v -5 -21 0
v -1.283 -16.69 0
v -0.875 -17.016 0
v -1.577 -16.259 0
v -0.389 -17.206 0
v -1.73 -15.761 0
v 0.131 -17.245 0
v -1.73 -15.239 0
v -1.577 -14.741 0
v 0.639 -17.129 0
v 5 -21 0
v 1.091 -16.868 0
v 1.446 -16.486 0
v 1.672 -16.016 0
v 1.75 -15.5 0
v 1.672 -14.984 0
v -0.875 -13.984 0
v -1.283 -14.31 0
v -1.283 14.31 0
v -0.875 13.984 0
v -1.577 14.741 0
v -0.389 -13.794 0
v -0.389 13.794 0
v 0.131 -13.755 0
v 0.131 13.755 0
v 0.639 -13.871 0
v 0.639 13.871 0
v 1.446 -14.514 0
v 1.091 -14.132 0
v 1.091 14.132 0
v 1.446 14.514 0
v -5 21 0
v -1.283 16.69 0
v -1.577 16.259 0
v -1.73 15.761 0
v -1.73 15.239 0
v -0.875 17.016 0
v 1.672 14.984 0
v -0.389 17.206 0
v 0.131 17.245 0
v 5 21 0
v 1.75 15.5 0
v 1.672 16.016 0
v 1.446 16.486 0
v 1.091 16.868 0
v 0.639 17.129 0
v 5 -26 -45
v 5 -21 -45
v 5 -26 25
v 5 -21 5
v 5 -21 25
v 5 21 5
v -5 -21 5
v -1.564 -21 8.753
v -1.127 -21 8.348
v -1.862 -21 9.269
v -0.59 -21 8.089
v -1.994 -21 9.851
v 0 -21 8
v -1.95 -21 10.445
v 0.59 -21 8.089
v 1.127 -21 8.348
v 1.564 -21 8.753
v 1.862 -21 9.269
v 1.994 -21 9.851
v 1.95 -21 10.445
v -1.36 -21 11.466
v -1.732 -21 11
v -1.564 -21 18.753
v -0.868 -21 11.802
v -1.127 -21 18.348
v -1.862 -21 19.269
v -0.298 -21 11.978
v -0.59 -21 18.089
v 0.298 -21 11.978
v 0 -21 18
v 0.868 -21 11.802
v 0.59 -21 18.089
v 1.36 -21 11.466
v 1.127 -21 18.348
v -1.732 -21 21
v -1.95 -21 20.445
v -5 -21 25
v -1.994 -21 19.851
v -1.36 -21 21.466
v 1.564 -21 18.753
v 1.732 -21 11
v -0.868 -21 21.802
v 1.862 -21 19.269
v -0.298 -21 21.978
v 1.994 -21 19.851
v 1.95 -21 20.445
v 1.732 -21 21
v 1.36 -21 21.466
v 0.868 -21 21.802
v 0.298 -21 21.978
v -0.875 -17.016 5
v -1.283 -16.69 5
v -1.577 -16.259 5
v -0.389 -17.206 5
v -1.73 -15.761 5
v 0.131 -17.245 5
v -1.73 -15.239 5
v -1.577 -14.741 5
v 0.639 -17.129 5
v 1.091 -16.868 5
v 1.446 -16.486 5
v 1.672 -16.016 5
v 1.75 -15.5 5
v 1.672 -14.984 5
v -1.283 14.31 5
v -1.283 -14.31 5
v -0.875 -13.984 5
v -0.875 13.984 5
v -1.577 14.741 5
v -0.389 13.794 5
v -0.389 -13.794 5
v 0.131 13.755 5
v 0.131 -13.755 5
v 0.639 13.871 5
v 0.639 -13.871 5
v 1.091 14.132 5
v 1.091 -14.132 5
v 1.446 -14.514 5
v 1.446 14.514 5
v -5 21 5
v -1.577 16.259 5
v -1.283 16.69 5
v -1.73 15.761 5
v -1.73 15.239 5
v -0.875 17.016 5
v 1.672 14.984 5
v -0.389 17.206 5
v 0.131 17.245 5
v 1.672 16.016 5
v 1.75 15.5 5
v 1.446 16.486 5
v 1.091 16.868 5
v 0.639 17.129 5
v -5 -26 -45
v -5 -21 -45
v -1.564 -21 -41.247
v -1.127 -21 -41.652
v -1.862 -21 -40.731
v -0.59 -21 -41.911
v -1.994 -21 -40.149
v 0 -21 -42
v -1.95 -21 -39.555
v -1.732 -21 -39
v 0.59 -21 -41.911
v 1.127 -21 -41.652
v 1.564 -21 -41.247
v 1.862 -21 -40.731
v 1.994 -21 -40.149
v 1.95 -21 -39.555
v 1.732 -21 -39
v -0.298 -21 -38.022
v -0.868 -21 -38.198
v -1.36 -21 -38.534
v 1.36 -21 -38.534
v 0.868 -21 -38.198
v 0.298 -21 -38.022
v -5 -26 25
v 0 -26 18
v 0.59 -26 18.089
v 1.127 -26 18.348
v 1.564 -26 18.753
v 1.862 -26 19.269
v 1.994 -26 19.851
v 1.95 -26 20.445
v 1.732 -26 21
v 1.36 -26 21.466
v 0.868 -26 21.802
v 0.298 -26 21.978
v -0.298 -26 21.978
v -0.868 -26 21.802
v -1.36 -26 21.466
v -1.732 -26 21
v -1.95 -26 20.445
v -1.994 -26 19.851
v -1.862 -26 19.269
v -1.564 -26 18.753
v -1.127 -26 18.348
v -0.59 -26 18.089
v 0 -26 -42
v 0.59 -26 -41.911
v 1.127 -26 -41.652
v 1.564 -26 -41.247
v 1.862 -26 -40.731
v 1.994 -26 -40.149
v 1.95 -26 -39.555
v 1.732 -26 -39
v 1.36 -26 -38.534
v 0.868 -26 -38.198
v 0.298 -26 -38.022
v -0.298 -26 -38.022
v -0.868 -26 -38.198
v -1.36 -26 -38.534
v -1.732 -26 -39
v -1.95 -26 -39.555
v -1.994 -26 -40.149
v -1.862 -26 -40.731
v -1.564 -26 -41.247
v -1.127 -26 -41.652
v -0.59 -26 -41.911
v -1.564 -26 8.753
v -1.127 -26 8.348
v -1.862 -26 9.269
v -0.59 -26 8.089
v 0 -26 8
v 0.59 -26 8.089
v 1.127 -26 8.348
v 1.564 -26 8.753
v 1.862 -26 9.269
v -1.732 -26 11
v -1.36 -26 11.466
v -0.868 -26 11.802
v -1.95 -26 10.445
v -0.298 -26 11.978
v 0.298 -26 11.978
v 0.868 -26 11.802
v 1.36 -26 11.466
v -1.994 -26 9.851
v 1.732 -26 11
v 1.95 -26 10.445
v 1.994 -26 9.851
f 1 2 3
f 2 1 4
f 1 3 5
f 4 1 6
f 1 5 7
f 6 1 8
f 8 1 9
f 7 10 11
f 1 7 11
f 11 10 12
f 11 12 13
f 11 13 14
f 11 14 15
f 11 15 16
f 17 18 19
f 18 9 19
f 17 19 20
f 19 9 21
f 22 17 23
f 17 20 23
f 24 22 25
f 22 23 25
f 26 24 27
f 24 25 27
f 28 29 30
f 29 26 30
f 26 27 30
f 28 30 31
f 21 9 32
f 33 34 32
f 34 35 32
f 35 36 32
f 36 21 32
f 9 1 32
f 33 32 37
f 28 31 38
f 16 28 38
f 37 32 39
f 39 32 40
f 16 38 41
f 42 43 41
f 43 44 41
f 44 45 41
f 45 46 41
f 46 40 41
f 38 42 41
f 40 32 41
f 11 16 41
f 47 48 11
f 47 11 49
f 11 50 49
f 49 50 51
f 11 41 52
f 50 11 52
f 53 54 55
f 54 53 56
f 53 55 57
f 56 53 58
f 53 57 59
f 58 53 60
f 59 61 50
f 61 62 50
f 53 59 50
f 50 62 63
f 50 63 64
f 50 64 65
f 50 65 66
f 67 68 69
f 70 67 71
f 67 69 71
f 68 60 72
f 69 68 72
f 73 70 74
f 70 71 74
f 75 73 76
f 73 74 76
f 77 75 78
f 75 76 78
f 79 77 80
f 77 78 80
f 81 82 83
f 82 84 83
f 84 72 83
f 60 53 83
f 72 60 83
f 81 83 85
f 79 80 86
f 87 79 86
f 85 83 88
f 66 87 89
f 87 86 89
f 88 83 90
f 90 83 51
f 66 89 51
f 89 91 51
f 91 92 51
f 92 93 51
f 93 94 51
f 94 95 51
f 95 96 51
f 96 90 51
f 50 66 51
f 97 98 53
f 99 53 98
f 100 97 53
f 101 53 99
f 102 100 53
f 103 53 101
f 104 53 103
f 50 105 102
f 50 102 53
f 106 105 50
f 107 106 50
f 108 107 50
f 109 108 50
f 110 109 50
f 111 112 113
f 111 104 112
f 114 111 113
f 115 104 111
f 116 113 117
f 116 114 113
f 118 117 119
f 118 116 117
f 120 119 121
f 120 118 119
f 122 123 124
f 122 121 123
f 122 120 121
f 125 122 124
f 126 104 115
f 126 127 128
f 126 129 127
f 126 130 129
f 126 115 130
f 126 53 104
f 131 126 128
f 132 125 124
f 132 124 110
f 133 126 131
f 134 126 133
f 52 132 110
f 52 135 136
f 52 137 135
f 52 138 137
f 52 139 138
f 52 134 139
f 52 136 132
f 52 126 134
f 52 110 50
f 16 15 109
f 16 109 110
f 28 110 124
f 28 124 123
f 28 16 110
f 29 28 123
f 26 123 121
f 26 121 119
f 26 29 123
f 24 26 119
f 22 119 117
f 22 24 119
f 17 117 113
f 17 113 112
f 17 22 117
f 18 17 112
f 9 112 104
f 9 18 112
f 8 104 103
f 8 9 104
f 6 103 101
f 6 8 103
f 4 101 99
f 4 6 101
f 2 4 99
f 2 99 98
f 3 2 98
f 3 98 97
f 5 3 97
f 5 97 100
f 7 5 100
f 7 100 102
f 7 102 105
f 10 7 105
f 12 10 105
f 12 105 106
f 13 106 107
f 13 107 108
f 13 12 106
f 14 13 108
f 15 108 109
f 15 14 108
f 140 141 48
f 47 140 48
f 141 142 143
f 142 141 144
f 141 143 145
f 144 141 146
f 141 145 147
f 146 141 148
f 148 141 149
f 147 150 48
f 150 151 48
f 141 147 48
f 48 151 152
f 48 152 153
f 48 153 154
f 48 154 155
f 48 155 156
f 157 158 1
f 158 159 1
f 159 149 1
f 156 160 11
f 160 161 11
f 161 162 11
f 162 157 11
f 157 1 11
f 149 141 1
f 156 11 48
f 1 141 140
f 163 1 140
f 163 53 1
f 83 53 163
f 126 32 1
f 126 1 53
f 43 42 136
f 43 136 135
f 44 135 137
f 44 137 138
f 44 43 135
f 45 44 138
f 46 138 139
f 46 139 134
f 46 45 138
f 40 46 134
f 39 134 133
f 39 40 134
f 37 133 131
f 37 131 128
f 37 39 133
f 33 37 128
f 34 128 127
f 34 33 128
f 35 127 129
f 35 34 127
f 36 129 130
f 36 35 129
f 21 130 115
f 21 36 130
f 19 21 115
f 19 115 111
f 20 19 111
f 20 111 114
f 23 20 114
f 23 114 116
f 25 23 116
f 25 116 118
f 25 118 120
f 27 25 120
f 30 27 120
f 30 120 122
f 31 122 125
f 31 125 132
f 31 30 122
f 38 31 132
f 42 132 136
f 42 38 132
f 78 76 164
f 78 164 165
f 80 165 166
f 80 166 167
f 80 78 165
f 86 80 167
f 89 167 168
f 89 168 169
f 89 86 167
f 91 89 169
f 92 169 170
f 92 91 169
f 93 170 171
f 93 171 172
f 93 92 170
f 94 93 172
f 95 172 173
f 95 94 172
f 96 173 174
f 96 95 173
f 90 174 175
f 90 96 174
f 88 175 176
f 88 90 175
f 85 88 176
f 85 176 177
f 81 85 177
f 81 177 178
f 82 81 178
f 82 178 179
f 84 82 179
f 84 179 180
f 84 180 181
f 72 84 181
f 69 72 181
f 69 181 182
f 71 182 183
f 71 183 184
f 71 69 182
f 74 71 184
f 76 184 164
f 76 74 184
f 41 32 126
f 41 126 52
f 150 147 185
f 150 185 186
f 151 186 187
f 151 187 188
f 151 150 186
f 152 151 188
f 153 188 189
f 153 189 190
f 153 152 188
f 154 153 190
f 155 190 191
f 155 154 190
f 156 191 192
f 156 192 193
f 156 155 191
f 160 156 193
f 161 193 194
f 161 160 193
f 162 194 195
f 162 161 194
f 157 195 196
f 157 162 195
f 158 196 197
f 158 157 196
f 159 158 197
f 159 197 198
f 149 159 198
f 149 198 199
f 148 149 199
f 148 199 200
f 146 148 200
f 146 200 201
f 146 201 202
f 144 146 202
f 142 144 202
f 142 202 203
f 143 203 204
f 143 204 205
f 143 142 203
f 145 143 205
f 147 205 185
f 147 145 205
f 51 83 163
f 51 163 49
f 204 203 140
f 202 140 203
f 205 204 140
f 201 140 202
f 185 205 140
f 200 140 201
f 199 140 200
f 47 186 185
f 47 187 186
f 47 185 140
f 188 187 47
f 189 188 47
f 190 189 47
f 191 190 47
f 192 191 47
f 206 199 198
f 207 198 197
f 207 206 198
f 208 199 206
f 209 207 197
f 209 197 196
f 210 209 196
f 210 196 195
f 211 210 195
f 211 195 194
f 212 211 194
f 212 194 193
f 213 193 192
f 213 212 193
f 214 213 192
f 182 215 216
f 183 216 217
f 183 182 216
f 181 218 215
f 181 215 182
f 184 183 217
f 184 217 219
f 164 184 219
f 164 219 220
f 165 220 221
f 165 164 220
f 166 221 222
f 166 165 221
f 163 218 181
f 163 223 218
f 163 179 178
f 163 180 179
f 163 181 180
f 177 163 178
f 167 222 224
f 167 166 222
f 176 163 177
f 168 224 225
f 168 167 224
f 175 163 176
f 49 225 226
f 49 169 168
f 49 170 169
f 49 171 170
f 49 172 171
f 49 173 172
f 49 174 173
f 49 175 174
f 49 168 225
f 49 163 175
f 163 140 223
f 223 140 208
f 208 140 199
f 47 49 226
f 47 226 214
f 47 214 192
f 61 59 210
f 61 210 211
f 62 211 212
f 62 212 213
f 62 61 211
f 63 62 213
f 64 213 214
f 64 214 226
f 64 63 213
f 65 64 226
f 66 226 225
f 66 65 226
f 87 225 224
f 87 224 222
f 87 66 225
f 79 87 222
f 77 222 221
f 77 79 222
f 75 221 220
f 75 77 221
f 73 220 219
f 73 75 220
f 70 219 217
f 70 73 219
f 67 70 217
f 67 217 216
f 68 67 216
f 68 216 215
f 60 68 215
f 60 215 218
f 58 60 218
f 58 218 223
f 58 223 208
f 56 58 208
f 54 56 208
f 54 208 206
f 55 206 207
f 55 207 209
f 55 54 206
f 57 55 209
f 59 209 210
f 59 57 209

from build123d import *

# Parameters (mm, degrees)
ESBO_O1_W                = 10
ESBO_O1_H                = 42
ESBO_O1_R                = 1.75
RESSALTO_EXTRUS_O1_DEPTH = 5
ESBO_O2_W                = 10
ESBO_O2_H                = 70
ESBO_O2_R                = 2
RESSALTO_EXTRUS_O2_DEPTH = 5


with BuildPart() as part:
    # Esboço1 → Ressalto-extrusão1 (new body)
    with BuildSketch(Plane.XY):
        Rectangle(ESBO_O1_W, ESBO_O1_H)
        with Locations((0, 15.5)):
            Circle(ESBO_O1_R, mode=Mode.SUBTRACT)
        with Locations((0, -15.5)):
            Circle(ESBO_O1_R, mode=Mode.SUBTRACT)
    extrude(amount=RESSALTO_EXTRUS_O1_DEPTH)

    # Esboço2 → Ressalto-extrusão2 (add)
    with BuildSketch(Plane.XZ.offset(21)):
        with Locations((0, -10)):
            Rectangle(ESBO_O2_W, ESBO_O2_H)
        with Locations(Location((0, 20, 0), (0, 0, 270))):
            Circle(ESBO_O2_R, mode=Mode.SUBTRACT)
        with Locations(Location((0, -40, 0), (0, 0, 270))):
            Circle(ESBO_O2_R, mode=Mode.SUBTRACT)
        with Locations(Location((0, 10, 0), (0, 0, 270))):
            Circle(ESBO_O2_R, mode=Mode.SUBTRACT)
    extrude(amount=RESSALTO_EXTRUS_O2_DEPTH)


solid = part.part
